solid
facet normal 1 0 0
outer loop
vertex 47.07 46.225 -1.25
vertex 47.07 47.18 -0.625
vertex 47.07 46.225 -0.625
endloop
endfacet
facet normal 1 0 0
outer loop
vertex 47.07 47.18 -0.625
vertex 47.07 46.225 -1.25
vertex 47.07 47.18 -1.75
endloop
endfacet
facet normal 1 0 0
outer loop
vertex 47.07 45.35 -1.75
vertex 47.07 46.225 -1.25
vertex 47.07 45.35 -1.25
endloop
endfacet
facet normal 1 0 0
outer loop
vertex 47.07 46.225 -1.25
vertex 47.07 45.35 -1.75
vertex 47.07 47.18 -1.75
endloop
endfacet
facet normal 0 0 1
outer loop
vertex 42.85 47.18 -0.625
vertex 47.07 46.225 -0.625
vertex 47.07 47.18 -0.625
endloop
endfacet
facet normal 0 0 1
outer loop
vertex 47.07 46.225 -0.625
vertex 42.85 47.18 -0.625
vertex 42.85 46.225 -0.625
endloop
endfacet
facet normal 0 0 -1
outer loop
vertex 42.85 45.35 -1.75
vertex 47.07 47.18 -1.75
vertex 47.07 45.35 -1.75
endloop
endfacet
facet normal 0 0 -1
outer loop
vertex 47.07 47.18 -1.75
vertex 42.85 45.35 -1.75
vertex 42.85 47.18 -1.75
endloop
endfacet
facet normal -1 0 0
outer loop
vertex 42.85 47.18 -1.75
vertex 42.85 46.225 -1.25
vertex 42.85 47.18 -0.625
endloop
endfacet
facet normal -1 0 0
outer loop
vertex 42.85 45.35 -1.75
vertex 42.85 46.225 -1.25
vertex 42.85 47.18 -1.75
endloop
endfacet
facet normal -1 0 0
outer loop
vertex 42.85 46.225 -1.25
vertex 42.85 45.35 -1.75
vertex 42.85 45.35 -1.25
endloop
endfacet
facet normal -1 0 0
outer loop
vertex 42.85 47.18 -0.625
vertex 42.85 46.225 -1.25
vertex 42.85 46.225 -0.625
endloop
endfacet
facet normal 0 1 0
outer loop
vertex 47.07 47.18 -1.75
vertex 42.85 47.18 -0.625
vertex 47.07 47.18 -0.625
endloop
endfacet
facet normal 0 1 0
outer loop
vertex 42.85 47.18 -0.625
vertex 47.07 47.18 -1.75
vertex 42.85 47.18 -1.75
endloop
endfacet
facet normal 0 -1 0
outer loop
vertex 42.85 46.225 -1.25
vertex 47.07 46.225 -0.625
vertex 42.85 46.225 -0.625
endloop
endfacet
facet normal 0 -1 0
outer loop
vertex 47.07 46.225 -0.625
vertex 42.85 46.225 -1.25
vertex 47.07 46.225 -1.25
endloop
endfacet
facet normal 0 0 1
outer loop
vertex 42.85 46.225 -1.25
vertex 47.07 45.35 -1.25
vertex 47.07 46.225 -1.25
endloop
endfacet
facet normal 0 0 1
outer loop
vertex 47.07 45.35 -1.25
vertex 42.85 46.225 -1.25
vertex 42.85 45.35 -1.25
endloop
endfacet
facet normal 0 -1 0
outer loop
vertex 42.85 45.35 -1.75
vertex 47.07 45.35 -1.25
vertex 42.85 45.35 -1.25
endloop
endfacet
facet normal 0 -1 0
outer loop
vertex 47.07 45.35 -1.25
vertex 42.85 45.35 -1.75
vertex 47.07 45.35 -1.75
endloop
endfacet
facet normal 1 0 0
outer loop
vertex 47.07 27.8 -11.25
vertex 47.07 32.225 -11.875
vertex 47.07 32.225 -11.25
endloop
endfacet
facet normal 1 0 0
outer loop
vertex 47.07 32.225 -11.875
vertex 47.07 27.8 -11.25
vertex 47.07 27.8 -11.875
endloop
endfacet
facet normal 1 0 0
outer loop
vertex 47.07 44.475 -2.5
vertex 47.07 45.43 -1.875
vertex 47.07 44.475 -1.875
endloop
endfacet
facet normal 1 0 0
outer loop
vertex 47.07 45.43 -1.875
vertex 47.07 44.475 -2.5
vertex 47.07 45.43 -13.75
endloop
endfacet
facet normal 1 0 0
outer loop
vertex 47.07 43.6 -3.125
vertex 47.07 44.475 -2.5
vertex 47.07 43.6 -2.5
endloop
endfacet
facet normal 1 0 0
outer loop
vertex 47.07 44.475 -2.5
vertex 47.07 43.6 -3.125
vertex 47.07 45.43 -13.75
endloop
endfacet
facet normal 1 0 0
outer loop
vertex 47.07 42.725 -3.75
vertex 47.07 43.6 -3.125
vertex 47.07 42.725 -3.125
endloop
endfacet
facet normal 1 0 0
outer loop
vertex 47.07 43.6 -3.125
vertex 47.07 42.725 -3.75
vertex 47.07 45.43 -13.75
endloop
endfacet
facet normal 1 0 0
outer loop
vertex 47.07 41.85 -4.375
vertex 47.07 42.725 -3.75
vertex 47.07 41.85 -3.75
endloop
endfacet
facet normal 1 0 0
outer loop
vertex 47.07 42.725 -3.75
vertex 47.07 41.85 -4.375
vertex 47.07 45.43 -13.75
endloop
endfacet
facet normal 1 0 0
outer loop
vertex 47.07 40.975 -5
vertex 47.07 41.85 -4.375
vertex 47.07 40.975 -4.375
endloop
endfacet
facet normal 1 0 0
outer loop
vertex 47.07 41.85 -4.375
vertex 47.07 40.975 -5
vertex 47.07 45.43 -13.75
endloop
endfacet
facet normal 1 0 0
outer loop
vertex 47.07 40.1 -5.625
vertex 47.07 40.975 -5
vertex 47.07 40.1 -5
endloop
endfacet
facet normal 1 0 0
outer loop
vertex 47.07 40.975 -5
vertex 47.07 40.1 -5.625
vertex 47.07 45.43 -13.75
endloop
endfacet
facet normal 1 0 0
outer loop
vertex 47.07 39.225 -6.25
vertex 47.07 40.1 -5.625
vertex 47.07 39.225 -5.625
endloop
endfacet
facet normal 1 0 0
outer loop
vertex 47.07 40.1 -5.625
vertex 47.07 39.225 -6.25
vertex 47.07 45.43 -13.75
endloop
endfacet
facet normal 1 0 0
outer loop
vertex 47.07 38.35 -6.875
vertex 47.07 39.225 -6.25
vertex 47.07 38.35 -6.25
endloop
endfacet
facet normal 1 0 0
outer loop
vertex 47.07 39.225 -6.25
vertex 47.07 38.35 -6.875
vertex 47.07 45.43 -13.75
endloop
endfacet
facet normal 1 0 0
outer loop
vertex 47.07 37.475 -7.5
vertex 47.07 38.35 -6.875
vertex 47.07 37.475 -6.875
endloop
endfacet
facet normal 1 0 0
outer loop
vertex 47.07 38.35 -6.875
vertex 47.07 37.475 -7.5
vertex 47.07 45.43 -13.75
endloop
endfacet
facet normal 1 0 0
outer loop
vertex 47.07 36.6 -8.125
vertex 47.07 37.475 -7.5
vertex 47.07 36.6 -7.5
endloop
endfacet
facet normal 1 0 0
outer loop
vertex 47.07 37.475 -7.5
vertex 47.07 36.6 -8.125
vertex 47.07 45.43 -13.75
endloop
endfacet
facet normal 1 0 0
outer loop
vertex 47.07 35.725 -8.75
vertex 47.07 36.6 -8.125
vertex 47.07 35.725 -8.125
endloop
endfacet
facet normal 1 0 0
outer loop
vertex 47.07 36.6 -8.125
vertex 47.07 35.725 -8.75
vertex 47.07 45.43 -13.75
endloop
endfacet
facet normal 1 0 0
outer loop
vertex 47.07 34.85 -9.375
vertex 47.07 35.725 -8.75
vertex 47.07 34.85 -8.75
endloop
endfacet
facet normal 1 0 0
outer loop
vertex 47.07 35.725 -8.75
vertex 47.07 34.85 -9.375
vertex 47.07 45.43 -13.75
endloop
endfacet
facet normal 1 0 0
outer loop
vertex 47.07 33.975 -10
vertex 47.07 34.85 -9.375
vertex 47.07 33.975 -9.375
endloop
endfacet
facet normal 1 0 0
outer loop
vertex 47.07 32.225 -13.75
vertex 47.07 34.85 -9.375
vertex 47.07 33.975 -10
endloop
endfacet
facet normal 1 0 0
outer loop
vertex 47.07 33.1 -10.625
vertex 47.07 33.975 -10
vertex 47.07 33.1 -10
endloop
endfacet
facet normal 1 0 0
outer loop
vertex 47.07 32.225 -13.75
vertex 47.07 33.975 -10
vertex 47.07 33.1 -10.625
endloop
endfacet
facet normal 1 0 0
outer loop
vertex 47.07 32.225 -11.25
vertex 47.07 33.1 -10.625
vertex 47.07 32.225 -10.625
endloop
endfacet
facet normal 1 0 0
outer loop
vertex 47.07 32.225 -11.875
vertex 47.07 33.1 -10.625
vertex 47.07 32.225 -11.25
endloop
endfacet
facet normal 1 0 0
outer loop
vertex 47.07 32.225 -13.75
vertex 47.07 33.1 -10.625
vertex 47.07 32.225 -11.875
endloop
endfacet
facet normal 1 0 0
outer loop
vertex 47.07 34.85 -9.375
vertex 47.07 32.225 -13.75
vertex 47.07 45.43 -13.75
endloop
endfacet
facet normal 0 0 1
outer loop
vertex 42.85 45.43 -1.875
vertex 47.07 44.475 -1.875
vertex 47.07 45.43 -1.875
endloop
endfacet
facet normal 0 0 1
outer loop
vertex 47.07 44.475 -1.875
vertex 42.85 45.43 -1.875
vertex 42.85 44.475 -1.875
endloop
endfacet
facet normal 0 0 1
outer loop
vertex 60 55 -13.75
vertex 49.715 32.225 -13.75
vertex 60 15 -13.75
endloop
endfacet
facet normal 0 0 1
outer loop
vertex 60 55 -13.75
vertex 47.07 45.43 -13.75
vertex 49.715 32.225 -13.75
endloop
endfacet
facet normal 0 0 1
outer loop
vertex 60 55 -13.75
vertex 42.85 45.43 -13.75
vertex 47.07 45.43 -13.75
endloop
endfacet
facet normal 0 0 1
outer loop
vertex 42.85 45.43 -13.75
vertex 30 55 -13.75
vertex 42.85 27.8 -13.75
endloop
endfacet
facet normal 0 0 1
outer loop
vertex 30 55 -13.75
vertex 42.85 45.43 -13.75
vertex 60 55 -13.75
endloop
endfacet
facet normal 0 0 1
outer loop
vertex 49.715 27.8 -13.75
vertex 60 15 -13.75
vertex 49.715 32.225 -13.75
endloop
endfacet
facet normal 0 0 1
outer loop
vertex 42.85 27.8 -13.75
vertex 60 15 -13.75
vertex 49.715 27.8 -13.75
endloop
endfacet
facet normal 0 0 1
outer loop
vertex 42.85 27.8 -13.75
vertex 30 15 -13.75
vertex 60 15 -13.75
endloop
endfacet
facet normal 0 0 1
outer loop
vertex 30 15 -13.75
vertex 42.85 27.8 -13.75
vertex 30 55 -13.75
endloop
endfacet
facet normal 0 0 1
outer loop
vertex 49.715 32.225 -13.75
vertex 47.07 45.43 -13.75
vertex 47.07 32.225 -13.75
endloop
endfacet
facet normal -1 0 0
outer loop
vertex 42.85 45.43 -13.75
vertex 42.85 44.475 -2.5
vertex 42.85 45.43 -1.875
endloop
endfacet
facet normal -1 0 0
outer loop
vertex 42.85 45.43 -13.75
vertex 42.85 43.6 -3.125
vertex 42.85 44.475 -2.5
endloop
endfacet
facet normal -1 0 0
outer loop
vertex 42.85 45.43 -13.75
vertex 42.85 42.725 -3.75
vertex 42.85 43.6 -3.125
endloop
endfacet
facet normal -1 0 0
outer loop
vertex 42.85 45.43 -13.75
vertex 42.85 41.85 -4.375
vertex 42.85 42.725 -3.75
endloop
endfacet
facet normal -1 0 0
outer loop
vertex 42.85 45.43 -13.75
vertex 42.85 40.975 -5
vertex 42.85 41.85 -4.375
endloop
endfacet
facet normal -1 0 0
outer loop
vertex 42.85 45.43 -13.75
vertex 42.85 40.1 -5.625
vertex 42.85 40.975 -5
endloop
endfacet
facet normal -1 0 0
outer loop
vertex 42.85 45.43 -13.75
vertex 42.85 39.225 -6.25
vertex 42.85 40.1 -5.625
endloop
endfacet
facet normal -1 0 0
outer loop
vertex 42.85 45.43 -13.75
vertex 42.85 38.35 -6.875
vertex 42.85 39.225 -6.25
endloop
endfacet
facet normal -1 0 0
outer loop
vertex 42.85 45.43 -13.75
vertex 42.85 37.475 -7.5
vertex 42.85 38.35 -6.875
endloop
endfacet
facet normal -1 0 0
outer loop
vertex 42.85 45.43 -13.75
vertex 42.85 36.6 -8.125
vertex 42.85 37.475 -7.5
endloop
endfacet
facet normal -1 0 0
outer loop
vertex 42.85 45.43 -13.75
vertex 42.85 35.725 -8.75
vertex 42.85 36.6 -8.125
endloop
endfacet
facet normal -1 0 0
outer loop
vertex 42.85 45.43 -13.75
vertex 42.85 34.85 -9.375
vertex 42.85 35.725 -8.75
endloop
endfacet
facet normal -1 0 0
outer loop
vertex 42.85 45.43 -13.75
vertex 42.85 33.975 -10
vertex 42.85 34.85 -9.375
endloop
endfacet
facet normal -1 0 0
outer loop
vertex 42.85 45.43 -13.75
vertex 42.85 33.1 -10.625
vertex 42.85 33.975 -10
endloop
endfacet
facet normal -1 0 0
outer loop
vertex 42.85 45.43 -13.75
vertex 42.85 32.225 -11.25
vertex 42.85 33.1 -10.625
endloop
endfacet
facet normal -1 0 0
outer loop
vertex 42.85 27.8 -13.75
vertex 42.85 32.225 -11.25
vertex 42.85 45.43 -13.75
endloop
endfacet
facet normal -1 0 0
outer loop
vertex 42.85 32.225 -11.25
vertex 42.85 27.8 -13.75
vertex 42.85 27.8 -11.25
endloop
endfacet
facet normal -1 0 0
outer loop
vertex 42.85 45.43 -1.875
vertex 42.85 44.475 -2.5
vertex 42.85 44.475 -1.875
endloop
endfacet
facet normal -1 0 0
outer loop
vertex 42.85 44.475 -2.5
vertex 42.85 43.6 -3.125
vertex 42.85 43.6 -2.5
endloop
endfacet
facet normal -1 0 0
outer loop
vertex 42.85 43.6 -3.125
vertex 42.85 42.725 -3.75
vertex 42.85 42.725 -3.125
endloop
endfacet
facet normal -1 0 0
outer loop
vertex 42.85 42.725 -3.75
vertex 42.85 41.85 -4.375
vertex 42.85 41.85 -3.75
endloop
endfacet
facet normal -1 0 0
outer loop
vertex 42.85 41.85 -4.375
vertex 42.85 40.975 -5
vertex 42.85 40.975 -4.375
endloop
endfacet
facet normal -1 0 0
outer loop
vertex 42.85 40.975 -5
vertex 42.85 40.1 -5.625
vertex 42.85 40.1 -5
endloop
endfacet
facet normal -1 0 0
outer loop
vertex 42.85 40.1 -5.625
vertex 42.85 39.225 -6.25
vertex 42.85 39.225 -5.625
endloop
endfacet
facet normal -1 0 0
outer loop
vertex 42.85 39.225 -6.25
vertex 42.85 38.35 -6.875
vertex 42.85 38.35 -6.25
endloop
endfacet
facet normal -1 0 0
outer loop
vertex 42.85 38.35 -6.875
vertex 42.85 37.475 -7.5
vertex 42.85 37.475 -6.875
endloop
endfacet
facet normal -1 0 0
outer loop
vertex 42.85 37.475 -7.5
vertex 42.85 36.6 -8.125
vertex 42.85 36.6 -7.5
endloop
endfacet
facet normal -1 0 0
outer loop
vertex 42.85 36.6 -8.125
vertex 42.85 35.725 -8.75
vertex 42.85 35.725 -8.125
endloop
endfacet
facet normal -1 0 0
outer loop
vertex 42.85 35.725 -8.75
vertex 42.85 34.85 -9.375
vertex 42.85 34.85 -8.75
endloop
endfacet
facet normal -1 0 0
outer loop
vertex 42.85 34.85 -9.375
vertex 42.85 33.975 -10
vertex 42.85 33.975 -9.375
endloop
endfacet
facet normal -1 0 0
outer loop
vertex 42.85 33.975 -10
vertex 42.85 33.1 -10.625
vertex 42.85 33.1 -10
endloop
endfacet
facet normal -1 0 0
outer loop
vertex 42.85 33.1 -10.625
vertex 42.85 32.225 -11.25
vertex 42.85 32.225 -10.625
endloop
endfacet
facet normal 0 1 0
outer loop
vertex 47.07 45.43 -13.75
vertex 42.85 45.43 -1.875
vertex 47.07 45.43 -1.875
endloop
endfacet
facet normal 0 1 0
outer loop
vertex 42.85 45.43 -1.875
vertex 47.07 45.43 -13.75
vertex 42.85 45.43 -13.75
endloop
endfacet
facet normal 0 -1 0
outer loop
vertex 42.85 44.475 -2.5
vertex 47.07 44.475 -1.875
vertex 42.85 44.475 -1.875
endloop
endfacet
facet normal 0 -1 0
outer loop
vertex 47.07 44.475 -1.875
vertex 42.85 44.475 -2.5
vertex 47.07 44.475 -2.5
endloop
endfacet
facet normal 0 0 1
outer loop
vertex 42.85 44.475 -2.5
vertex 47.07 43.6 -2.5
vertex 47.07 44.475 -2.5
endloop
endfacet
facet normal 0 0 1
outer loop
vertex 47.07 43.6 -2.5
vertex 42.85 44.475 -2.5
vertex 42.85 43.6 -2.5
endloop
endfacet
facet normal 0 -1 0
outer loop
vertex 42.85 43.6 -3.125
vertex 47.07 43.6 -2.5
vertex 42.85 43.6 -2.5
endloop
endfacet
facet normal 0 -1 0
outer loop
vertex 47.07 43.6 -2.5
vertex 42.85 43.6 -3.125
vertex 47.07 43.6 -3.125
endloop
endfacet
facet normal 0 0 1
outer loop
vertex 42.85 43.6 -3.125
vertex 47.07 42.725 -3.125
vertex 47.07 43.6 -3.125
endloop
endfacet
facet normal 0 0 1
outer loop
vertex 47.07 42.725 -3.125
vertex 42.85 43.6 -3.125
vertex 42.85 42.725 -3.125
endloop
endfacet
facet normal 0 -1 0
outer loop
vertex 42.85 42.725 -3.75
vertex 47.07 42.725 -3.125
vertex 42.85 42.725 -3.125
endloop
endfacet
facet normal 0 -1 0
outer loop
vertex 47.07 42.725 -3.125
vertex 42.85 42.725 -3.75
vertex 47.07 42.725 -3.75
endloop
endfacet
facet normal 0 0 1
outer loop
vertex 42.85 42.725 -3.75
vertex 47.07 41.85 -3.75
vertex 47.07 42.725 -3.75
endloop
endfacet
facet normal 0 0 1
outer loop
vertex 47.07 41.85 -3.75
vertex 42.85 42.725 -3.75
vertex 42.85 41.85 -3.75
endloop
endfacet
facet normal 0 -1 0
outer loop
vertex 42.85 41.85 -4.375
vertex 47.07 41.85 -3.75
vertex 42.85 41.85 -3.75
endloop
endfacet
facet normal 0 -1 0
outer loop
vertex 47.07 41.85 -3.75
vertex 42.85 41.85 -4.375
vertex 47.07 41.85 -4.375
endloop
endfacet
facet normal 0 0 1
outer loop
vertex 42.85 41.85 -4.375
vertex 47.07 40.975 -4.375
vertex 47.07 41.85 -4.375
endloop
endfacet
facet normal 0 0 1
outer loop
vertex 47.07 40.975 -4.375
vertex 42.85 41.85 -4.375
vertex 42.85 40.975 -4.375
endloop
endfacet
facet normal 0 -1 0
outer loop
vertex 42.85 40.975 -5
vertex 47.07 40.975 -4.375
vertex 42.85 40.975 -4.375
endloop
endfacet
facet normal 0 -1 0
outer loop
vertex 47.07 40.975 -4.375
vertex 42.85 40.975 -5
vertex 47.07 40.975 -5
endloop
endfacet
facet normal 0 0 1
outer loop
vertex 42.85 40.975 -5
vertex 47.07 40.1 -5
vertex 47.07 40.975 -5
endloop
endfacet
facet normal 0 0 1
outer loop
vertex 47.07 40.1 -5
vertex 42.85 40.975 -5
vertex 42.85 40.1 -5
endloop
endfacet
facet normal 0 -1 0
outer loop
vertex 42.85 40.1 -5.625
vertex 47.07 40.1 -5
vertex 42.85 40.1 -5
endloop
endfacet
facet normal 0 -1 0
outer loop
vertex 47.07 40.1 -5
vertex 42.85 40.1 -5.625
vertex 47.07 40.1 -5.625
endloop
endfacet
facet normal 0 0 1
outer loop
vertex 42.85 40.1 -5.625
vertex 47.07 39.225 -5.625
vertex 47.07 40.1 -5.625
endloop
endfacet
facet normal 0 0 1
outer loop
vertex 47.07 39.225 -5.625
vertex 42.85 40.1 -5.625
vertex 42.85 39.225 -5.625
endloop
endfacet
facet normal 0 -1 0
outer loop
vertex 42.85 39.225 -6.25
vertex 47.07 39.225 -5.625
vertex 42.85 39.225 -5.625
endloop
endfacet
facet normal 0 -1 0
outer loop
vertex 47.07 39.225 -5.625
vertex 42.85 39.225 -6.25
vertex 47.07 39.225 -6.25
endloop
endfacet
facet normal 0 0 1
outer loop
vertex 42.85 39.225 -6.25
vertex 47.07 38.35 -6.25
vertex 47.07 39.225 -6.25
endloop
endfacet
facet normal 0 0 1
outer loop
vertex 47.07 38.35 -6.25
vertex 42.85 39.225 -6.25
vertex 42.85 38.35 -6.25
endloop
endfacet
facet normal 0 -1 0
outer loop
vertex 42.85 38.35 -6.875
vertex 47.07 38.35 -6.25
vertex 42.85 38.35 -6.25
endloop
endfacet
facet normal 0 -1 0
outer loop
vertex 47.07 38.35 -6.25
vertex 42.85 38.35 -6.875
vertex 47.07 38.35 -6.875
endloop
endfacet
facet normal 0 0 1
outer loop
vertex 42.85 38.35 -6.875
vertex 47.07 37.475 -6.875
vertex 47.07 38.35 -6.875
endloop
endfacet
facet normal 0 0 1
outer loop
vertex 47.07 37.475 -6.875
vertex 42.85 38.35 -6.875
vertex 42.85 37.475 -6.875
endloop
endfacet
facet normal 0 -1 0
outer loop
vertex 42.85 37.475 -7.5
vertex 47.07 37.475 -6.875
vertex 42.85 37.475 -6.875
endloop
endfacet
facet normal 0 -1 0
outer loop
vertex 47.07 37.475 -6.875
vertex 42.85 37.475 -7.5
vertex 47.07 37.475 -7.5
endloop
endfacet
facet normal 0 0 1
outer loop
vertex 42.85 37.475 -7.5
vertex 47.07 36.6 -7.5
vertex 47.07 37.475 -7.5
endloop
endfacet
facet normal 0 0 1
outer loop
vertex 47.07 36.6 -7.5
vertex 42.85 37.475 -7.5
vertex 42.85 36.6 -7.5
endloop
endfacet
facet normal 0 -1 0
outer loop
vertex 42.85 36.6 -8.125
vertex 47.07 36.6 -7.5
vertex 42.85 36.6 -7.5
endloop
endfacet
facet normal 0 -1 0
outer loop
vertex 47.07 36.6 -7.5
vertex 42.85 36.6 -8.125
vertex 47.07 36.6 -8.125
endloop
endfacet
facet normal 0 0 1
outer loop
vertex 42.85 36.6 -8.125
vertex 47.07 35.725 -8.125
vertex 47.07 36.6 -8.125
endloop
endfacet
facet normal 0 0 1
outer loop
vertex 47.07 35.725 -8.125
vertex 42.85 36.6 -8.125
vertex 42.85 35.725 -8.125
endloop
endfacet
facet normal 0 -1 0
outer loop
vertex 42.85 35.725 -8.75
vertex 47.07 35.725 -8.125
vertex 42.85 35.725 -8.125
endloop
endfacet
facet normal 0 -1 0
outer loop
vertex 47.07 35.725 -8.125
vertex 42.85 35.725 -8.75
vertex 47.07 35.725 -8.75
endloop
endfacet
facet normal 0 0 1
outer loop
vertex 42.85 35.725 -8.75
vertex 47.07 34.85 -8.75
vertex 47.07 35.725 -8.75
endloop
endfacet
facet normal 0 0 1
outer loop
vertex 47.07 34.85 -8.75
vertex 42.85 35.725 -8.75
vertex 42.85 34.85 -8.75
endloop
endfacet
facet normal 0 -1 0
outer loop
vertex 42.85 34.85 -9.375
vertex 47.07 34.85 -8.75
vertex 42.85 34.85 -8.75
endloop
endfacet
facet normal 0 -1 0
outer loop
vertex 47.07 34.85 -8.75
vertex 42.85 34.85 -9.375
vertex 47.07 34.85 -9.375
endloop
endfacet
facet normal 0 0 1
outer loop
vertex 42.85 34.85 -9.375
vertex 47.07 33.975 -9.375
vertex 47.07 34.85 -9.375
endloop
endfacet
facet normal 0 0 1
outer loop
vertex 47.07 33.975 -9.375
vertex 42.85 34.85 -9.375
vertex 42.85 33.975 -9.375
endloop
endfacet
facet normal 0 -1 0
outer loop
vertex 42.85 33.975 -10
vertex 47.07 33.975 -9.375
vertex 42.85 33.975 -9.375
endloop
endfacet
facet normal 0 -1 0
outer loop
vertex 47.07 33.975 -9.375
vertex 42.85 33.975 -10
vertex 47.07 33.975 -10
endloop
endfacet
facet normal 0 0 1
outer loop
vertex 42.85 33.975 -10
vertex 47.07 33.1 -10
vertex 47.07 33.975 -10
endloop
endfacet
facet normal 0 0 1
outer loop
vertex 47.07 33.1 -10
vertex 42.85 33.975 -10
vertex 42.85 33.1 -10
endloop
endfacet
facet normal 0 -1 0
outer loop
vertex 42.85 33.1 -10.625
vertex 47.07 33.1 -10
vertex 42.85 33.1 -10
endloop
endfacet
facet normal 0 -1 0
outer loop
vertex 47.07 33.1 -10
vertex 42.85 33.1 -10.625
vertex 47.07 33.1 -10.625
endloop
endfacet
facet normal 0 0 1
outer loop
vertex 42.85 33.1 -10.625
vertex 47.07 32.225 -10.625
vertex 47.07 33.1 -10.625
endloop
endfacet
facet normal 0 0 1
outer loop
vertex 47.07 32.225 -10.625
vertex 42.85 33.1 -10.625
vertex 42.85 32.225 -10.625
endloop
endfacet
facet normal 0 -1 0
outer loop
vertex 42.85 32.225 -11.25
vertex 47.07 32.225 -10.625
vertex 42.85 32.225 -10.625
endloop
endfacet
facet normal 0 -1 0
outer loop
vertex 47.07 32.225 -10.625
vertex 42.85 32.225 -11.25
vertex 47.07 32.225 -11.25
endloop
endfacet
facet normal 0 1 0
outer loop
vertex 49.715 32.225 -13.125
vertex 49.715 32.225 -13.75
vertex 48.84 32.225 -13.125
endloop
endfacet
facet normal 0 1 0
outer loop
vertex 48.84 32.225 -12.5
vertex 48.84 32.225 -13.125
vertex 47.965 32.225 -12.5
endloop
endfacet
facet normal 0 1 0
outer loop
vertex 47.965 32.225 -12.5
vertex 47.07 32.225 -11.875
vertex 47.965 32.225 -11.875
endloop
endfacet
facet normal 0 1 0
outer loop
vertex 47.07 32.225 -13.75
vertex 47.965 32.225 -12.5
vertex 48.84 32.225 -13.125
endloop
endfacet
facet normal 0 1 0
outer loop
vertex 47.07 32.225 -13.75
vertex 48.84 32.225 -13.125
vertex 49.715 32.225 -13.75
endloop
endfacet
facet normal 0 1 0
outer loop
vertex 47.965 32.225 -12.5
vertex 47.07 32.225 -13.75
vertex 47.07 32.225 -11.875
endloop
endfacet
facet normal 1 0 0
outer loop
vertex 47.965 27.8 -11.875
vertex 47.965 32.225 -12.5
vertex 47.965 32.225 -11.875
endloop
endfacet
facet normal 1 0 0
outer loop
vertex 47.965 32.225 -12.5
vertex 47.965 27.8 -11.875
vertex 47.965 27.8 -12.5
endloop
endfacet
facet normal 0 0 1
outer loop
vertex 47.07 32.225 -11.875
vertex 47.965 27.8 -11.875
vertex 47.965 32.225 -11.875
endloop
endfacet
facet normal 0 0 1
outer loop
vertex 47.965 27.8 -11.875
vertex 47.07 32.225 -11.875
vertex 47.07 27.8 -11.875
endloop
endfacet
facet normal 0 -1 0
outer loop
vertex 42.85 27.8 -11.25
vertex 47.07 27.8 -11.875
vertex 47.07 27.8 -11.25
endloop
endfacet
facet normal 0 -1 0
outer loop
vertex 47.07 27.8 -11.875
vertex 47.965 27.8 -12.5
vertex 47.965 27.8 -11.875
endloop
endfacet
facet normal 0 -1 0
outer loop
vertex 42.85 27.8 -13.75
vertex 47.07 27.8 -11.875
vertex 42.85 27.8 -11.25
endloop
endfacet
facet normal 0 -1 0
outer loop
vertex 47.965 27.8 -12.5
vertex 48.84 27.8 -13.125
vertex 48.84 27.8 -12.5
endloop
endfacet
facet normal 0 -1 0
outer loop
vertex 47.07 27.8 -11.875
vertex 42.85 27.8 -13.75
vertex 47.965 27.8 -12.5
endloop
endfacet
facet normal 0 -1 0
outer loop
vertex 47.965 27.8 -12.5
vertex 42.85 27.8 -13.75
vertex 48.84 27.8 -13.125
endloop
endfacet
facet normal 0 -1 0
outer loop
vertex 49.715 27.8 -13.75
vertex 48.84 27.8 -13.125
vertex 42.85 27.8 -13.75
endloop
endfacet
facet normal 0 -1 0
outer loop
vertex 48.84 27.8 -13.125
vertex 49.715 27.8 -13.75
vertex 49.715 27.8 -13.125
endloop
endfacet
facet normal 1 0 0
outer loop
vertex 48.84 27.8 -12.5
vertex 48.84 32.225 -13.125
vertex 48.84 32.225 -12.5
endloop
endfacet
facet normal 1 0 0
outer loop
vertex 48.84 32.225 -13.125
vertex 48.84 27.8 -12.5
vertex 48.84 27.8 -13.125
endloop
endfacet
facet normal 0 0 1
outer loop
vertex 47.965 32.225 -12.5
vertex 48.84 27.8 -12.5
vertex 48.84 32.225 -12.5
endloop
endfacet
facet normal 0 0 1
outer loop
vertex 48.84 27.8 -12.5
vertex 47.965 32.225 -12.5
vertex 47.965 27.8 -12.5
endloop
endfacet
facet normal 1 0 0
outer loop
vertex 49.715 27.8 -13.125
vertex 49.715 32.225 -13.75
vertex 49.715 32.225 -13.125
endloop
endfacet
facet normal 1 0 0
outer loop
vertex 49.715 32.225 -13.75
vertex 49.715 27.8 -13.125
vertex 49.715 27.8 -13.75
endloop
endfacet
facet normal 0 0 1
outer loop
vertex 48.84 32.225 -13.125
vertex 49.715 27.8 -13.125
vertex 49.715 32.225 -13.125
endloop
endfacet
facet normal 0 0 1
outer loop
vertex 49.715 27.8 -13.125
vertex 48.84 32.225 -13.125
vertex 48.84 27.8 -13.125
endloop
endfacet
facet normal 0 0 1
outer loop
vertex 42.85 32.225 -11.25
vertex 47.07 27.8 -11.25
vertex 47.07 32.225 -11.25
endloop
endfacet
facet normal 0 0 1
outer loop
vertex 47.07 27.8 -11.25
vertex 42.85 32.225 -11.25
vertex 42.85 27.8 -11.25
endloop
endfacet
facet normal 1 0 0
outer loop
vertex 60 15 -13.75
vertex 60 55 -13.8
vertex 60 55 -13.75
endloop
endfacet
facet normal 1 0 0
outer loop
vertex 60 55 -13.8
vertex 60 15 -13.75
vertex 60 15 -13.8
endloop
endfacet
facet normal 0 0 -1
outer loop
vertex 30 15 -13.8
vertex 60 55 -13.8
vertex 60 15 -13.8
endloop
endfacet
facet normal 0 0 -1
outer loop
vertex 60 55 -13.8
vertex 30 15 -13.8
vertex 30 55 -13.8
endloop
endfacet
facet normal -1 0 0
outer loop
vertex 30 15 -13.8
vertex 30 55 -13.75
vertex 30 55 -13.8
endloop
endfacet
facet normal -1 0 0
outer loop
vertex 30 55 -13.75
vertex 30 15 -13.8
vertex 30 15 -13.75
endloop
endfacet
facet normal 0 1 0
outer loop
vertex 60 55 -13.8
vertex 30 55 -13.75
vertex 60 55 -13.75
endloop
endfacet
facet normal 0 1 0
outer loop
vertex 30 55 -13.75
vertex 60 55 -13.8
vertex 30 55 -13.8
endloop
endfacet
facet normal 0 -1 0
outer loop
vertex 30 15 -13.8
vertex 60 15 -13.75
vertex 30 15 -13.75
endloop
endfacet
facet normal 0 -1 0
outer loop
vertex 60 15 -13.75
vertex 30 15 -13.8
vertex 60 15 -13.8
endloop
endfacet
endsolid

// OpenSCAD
// Option C stair only (both flights, landing), for the section render.
use <../../../models/house_lib.scad>
function sc_rise() = floor_to_floor() / 22;
function sc_run()  = 10.5 / 12;
function sc_n1()   = 18;
function sc_land_y() = [27.8, stair_top_y() - (sc_n1() - 1) * sc_run()];
module main_stair_c(z_main = 0, y_box = 45.34) {
    x0 = stair_x()[0] + wall_t() / 2;
    x1 = stair_x()[1] - wall_t() / 2;
    zb = z_main - floor_to_floor();
    paint(stair_color())
        for (i = [1 : sc_n1() - 1]) {
            ya = stair_top_y() - i * sc_run();
            z = z_main - i * sc_rise();
            zf = ya + sc_run() / 2 > y_box ? z_main - main_floor_depth() - 0.125 : zb;
            translate([x0, ya, zf]) cube([x1 - x0, sc_run() + 0.08, z - zf]);
        }
    zl = z_main - sc_n1() * sc_rise();
    paint(stair_color()) translate([x0, sc_land_y()[0], zb]) cube([x1 - x0, sc_land_y()[1] - sc_land_y()[0], zl - zb]);
    paint(stair_color())
        for (j = [1 : 3])
            translate([x1 + (j - 1) * sc_run(), sc_land_y()[0], zb])
                cube([sc_run() + 0.02, sc_land_y()[1] - sc_land_y()[0], zl - j * sc_rise() - zb]);
}
color([0.6,0.6,0.6,0.5]) translate([30,15,-13.8]) cube([30,40,0.05]);
main_stair_c();
